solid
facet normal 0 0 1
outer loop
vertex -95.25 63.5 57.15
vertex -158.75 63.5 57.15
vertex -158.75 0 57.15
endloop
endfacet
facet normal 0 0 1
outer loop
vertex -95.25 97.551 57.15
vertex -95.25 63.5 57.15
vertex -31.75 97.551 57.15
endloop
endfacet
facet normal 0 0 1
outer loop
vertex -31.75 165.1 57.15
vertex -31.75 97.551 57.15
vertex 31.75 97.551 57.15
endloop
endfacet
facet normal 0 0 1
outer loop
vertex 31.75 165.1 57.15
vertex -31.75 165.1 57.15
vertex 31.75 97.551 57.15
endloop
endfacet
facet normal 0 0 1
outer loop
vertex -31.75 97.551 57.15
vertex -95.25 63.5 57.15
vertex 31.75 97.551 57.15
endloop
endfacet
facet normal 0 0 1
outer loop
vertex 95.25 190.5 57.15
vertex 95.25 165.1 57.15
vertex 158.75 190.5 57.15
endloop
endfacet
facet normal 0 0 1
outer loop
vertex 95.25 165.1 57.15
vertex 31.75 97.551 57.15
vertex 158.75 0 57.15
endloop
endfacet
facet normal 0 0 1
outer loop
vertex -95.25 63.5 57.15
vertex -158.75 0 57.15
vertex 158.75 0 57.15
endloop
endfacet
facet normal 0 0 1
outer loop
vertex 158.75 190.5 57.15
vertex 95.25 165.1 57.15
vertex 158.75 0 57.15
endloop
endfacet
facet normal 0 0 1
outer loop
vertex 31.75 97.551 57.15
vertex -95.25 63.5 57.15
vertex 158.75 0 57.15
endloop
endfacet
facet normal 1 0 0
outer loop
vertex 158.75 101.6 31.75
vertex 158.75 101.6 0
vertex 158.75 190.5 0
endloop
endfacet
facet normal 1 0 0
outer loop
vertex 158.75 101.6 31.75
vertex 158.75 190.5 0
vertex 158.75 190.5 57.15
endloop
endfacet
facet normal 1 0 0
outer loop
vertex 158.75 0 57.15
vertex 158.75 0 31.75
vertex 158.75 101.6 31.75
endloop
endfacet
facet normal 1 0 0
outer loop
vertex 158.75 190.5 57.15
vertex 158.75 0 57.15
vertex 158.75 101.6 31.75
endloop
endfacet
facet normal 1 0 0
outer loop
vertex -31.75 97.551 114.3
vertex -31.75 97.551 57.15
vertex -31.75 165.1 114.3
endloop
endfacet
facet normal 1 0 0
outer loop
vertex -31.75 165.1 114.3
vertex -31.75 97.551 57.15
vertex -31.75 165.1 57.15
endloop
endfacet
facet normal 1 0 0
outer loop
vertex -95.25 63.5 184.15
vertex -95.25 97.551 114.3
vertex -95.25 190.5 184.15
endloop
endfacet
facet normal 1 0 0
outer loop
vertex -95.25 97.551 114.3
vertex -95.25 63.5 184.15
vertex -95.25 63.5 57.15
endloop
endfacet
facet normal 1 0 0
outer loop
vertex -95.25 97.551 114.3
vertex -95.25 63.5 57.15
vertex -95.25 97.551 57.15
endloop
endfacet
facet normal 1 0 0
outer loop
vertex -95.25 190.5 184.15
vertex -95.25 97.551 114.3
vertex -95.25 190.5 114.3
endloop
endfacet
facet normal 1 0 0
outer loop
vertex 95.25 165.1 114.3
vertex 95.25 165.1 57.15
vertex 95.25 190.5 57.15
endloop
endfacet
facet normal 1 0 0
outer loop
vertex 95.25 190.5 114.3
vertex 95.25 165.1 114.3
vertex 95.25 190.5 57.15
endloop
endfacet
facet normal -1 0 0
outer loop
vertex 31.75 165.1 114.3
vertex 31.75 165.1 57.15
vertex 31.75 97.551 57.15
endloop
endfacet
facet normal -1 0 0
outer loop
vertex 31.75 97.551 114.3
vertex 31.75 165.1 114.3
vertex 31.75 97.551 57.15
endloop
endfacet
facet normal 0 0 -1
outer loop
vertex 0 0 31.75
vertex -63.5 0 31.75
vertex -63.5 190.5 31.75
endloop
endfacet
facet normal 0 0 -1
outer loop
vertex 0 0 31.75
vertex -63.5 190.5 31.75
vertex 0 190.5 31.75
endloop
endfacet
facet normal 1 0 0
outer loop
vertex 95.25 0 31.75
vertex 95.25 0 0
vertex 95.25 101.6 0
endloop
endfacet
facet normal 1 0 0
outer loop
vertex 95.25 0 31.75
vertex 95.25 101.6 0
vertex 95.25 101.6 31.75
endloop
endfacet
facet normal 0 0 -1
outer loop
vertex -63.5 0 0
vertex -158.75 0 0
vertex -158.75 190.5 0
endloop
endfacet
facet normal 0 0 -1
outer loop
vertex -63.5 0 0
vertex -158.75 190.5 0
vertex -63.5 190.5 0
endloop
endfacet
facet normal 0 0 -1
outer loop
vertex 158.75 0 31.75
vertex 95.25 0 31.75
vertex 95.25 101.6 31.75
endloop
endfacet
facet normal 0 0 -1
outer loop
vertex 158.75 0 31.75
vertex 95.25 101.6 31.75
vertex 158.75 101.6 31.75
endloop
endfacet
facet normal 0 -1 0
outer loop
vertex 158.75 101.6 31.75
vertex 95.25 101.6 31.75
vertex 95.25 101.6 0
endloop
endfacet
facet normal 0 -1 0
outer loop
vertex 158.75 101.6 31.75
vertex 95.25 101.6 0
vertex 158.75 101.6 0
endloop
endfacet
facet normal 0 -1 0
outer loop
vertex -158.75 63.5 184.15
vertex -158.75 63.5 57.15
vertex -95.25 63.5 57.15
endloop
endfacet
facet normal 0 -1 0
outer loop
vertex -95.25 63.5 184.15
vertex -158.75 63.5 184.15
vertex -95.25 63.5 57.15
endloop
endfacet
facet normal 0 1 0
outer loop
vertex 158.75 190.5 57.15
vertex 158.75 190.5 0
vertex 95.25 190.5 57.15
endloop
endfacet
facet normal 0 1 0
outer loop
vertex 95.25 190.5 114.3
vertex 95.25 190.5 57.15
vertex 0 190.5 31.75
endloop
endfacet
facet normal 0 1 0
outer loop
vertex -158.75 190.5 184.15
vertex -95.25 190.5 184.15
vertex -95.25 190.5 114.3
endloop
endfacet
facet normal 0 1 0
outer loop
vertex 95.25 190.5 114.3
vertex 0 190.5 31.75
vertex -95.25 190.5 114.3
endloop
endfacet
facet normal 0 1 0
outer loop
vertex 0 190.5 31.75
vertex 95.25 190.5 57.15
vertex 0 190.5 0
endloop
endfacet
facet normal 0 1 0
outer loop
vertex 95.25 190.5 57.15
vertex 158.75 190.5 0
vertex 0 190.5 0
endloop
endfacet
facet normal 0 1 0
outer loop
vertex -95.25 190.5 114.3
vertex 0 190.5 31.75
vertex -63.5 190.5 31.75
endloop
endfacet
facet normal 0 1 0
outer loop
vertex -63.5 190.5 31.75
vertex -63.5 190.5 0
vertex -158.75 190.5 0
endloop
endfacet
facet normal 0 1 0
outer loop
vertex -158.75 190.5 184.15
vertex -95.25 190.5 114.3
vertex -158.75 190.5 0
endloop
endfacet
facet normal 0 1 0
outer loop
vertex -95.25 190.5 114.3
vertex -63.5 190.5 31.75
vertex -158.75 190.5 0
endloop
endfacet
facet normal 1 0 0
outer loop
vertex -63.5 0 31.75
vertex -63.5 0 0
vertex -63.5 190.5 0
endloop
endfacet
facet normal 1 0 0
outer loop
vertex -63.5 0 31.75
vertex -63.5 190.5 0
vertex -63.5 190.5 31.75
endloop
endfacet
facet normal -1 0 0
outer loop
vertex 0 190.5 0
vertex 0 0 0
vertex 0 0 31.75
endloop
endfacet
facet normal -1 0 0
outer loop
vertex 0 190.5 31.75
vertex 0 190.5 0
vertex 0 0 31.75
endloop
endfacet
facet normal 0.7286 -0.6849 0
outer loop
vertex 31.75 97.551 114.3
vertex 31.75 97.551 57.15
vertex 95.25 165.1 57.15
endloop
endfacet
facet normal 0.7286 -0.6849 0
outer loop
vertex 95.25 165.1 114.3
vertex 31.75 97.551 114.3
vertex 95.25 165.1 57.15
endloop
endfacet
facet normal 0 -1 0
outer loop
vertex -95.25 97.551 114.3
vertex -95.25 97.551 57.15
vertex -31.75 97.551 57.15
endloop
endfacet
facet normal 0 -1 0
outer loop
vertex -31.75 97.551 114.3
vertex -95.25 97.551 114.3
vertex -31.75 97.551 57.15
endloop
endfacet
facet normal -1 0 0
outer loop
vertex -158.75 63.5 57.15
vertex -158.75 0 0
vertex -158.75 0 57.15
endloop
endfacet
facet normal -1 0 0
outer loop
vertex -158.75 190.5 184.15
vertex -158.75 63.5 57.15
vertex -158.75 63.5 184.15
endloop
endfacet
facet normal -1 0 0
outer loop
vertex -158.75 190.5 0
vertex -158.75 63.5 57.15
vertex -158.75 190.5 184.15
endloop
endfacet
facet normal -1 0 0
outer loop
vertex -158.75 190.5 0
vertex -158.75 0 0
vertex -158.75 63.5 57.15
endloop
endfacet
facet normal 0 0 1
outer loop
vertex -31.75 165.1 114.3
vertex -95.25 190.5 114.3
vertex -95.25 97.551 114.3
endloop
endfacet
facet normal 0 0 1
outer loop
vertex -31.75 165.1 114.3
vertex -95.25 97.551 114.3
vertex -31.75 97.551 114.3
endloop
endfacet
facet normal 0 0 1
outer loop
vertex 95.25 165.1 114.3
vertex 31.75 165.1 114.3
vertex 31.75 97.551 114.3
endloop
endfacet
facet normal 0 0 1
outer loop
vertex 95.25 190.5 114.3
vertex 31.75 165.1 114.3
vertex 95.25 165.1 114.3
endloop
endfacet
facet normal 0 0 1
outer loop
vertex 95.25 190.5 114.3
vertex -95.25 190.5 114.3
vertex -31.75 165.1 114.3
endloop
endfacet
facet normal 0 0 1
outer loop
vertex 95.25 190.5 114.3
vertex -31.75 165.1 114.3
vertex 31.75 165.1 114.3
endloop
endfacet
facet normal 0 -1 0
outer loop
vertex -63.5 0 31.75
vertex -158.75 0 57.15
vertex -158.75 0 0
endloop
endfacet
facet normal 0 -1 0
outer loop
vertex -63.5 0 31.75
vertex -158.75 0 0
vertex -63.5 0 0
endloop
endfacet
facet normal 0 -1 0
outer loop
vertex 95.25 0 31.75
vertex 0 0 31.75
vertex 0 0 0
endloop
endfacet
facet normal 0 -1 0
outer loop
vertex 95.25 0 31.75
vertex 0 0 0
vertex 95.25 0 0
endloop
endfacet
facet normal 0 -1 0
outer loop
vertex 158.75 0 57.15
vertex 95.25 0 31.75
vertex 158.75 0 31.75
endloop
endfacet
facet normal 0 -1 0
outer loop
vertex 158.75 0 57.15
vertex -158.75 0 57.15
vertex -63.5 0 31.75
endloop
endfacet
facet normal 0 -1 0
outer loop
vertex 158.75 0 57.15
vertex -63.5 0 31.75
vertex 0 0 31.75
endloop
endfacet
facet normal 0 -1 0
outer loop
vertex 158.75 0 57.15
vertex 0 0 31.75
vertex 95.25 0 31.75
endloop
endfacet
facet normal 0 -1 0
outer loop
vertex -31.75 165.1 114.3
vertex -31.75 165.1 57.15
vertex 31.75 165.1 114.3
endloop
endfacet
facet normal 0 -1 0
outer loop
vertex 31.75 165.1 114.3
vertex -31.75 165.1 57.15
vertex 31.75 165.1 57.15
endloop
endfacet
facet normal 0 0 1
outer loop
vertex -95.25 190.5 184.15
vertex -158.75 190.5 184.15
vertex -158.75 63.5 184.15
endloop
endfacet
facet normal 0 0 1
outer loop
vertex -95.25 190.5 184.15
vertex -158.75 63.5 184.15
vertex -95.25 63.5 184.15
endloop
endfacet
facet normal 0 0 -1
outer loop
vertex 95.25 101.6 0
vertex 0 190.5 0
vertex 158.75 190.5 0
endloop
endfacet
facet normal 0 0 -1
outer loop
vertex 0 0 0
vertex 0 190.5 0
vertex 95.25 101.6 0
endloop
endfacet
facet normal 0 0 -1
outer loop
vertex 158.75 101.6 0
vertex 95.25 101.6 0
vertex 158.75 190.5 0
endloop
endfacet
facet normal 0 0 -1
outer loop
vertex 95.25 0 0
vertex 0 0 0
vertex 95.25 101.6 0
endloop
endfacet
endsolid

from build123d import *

# Parameters (mm, degrees)
F0_W     = 317.5
F0_H     = 57.15
F1_DEPTH = 190.5
F2_W     = 63.5
F2_H     = 31.75
F3_DEPTH = 190.501
F4_W     = 63.5
F4_H     = 31.75
F5_DEPTH = 101.6
F6_W     = 63.5
F6_H     = 127
F7_DEPTH = 127
F9_DEPTH = 57.15


with BuildPart() as f1:
    # F0 (on Front) → F1 (new body)
    with BuildSketch(Plane.XZ):
        with Locations((0, 28.575)):
            Rectangle(F0_W, F0_H)
    extrude(amount=-F1_DEPTH)

    # F2 (on face) → F3 (cut, through all)
    with BuildSketch(Plane.XZ):
        with Locations((-31.75, 15.875)):
            Rectangle(F2_W, F2_H)
    extrude(amount=-F3_DEPTH, mode=Mode.SUBTRACT)

    # F4 (on face) → F5 (cut)
    with BuildSketch(Plane.XZ):
        with Locations((127, 15.875)):
            Rectangle(F4_W, F4_H)
    extrude(amount=-F5_DEPTH, mode=Mode.SUBTRACT)

    # F6 (on face) → F7 (join)
    with BuildSketch(Plane.XY.offset(57.15)):
        with Locations((-127, 127)):
            Rectangle(F6_W, F6_H)
    extrude(amount=F7_DEPTH)

    # F8 (on face) → F9 (join)
    with BuildSketch(Plane.XY.offset(57.15)):
        Polygon((95.25, 190.5), (-95.25, 190.5), (-95.25, 97.55057), (-31.75, 97.55057), (-31.75, 165.1), (31.75, 165.1), (31.75, 97.55057), (95.25, 165.1), align=None)
    extrude(amount=F9_DEPTH)


solid = f1.part
